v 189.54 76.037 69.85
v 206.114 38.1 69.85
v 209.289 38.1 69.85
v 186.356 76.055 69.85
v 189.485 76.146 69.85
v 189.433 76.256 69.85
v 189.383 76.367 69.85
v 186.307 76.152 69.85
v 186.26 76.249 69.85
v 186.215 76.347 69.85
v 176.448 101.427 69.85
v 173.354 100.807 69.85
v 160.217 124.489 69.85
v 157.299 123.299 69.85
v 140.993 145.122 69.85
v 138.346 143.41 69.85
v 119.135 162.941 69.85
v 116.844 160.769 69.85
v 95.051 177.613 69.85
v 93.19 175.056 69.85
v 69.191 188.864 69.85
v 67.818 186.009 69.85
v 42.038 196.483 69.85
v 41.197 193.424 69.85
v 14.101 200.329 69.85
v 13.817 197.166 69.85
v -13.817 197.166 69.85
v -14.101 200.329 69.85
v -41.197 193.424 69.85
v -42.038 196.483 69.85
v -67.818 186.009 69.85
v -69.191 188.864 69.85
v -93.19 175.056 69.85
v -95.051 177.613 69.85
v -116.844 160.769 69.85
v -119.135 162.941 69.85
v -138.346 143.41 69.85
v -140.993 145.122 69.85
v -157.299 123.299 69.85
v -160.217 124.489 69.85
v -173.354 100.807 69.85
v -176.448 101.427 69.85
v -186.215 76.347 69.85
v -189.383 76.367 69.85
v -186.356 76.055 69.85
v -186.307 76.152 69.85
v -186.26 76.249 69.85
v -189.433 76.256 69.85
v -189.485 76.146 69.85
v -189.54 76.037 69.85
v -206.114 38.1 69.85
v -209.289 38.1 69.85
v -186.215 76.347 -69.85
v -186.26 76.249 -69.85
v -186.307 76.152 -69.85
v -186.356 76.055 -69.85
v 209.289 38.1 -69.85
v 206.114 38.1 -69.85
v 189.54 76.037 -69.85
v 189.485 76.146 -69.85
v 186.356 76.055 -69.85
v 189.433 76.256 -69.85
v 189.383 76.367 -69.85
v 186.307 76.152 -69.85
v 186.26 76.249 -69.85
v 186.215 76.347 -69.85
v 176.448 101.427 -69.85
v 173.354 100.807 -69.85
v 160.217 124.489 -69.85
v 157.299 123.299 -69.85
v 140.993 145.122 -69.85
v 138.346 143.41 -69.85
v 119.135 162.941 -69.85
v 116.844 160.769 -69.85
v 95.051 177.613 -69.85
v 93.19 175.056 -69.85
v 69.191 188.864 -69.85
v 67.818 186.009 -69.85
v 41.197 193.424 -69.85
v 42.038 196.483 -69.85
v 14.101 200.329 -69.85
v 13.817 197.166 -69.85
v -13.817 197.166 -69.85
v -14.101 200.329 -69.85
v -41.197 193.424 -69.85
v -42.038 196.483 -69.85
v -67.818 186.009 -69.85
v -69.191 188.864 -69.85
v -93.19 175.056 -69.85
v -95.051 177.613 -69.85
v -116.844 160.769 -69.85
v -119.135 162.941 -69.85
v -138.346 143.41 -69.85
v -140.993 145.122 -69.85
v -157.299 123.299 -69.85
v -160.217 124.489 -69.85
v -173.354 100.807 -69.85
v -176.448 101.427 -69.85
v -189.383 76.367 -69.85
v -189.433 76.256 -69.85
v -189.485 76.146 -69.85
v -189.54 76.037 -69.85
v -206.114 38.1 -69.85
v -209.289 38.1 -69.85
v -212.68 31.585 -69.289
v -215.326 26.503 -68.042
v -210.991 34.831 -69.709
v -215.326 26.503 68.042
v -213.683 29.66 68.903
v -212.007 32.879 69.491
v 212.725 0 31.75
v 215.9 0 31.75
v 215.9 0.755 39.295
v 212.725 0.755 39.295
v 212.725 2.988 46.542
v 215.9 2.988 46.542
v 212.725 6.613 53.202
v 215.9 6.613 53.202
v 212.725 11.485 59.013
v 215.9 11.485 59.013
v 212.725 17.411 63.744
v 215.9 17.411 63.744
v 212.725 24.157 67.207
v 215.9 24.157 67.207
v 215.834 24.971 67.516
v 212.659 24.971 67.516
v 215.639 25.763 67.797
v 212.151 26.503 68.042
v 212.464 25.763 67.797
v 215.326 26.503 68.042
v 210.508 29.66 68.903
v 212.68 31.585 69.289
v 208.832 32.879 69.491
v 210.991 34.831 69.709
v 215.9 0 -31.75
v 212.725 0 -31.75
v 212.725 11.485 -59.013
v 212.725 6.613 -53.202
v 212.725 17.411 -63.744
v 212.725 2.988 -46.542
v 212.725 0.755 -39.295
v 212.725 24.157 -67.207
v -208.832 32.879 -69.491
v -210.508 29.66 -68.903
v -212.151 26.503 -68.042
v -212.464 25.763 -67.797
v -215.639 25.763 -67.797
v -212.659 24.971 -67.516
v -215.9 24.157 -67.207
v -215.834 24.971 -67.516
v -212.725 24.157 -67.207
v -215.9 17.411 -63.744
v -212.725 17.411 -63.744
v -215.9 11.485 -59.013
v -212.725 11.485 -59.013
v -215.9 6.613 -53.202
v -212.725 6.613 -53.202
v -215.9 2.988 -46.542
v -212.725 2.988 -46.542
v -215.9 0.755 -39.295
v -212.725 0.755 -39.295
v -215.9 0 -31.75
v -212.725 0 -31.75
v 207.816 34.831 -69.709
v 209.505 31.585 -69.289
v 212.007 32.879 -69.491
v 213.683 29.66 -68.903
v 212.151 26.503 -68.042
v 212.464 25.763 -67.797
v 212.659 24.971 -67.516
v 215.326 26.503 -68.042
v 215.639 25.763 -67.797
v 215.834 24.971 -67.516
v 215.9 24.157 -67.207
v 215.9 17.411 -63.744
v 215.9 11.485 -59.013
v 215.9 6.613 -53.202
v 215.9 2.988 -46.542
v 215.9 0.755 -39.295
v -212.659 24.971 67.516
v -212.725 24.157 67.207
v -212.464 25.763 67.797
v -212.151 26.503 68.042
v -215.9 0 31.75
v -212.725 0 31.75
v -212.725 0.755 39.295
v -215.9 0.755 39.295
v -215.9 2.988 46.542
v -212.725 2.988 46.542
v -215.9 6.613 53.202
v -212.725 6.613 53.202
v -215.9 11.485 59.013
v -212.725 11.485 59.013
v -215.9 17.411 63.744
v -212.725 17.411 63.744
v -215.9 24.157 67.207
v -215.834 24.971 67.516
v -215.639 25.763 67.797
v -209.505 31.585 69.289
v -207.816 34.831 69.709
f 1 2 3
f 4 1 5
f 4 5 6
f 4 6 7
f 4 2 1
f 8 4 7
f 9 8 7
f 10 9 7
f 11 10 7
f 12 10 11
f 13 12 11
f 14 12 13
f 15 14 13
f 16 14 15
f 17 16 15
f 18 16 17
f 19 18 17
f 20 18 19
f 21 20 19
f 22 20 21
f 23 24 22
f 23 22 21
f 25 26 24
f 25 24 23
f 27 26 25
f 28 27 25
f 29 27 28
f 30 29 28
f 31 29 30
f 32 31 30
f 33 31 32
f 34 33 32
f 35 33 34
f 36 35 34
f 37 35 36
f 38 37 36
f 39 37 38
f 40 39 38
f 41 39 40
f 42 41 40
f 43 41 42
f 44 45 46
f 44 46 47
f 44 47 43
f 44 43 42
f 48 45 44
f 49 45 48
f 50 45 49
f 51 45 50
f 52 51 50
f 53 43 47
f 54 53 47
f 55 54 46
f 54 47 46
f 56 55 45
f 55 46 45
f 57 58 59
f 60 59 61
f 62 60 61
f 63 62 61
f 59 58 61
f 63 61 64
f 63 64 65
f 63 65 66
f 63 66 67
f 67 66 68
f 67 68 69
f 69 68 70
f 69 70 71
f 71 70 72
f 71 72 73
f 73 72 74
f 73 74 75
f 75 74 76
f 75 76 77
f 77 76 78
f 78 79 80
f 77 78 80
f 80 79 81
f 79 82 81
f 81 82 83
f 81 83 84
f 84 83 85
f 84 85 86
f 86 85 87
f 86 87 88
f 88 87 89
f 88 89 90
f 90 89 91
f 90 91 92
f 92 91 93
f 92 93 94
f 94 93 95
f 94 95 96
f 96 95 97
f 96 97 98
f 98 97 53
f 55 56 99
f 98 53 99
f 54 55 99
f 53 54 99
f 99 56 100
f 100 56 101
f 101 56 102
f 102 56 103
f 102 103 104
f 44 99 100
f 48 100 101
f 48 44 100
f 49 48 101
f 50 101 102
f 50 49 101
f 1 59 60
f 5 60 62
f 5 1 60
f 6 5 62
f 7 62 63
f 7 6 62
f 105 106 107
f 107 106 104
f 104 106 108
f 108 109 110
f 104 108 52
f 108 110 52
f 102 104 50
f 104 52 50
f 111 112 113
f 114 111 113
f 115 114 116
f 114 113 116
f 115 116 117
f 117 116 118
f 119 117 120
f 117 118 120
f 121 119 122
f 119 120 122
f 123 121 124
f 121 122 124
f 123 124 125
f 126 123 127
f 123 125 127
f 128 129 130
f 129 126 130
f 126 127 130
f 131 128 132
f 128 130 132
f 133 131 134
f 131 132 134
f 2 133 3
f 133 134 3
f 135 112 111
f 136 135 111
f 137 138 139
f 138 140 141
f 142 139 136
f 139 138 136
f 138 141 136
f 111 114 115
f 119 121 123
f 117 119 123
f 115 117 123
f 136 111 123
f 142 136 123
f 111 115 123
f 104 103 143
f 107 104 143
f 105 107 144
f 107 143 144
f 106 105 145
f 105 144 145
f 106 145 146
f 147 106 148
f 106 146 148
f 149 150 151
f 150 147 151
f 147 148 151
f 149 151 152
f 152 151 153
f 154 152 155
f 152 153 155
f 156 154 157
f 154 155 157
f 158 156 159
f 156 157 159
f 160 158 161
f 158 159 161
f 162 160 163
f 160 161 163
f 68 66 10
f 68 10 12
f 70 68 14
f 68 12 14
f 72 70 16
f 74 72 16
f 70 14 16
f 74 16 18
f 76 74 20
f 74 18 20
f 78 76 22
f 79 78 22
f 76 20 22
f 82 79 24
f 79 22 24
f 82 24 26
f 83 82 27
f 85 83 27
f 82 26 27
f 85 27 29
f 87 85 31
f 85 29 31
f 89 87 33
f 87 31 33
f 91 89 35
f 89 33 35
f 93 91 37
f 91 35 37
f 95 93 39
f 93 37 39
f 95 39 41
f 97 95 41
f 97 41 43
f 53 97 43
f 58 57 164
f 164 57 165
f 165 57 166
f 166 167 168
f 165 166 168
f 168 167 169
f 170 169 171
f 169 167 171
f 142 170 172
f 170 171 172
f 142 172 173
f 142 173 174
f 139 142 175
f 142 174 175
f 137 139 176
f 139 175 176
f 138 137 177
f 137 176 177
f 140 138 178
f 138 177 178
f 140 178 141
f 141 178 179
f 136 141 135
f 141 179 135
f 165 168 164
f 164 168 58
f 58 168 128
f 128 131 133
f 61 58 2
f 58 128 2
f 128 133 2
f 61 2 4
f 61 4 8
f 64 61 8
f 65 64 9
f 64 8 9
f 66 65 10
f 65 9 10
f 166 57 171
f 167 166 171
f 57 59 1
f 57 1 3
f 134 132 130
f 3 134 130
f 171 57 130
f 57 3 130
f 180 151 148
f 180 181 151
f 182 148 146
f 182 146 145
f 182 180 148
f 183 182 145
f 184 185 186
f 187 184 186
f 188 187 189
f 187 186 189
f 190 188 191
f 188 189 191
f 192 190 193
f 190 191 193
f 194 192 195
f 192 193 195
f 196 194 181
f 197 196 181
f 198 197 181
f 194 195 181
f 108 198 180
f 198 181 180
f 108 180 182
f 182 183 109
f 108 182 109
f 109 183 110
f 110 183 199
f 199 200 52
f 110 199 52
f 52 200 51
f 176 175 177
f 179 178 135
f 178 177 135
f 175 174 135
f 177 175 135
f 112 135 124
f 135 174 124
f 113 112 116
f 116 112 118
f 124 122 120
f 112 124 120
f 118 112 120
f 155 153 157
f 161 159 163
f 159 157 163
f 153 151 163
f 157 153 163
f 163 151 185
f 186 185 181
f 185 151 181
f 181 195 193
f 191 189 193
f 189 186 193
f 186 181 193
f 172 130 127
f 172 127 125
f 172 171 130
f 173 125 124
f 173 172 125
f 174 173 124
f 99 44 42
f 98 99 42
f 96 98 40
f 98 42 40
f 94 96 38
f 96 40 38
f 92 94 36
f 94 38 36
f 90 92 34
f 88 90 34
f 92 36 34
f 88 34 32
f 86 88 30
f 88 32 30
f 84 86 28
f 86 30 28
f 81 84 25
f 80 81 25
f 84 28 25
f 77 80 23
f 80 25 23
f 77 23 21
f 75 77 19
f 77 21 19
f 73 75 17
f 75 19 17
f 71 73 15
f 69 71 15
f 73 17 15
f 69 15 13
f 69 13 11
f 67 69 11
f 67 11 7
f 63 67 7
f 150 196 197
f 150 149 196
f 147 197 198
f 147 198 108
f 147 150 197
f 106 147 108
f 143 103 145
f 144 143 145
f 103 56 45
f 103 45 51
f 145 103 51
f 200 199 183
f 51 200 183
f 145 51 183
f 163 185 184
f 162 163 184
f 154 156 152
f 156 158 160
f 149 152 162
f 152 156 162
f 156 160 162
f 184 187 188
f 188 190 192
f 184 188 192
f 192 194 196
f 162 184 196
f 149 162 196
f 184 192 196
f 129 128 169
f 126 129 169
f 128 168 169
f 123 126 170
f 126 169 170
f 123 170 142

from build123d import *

# Parameters (mm, degrees)
BOSS_EXTRUDE1_DEPTH = 69.85
FILLET1_R           = 38.1
FILLET2_R           = 38.1
FILLET3_R           = 38.1
FILLET4_R           = 38.1
FILLET5_R           = 5.08
FILLET6_R           = 5.08


with BuildPart() as part:
    # Sketch2 → Boss-Extrude1 (new, symmetric)
    with BuildSketch(Plane.XY):
        with BuildLine():
            Line((-212.725, 0), (-215.9, 0))
            Line((-215.9, 0), (-215.9, 25.4))
            Line((-215.9, 25.4), (-189.455193832, 76.2))
            ThreePointArc((-189.455193832, 76.2), (0, 200.810907661), (189.455193832, 76.2))
            Line((189.455193832, 76.2), (215.9, 25.4))
            Line((215.9, 25.4), (215.9, 0))
            Line((215.9, 0), (212.725, 0))
            Line((212.725, 0), (212.725, 25.4))
            Line((212.725, 25.4), (186.280193832, 76.2))
            ThreePointArc((186.280193832, 76.2), (0, 197.635907661), (-186.280193832, 76.2))
            Line((-186.280193832, 76.2), (-212.725, 25.4))
            Line((-212.725, 25.4), (-212.725, 0))
        make_face()
    extrude(amount=BOSS_EXTRUDE1_DEPTH, both=True)

    # Fillet1
    # the kernel refuses this fillet: 38.1 mm, written as the material it takes off along each edge
    with BuildSketch(Plane(origin=(311.15, 0, -69.85), x_dir=(0, 1, 0), z_dir=(-1, 0, 0))) as fillet1_piece_1:
        with BuildLine():
            CenterArc((FILLET1_R, -FILLET1_R), FILLET1_R, 90, 90)
            Line((0, -FILLET1_R), (0, 0))
            Line((0, 0), (FILLET1_R, 0))
        make_face()
    extrude(amount=193.675, mode=Mode.SUBTRACT)

    # Fillet2
    # the kernel refuses this fillet: 38.1 mm, written as the material it takes off along each edge
    with BuildSketch(Plane(origin=(311.15, 0, 69.85), x_dir=(0, 0, -1), z_dir=(-1, 0, 0))) as fillet2_piece_1:
        with BuildLine():
            CenterArc((FILLET2_R, -FILLET2_R), FILLET2_R, 90, 90)
            Line((0, -FILLET2_R), (0, 0))
            Line((0, 0), (FILLET2_R, 0))
        make_face()
    extrude(amount=193.675, mode=Mode.SUBTRACT)

    # Fillet3
    # the kernel refuses this fillet: 38.1 mm, written as the material it takes off along each edge
    with BuildSketch(Plane(origin=(-117.475, 0, 69.85), x_dir=(0, 1, 0), z_dir=(-1, 0, 0))) as fillet3_piece_1:
        with BuildLine():
            CenterArc((FILLET3_R, FILLET3_R), FILLET3_R, 180, 90)
            Line((0, FILLET3_R), (0, 0))
            Line((0, 0), (FILLET3_R, 0))
        make_face()
    extrude(amount=193.675, mode=Mode.SUBTRACT)

    # Fillet4
    # the kernel refuses this fillet: 38.1 mm, written as the material it takes off along each edge
    with BuildSketch(Plane(origin=(-117.475, 0, -69.85), x_dir=(0, 1, 0), z_dir=(-1, 0, 0))) as fillet4_piece_1:
        with BuildLine():
            CenterArc((FILLET4_R, -FILLET4_R), FILLET4_R, 90, 90)
            Line((0, -FILLET4_R), (0, 0))
            Line((0, 0), (FILLET4_R, 0))
        make_face()
    extrude(amount=193.675, mode=Mode.SUBTRACT)

    # Fillet5
    fillet5_edges = [part.edges().sort_by_distance(p)[0] for p in [
        (215.9, 25.4, 0),
        (-215.9, 25.4, 0),
        (-212.725, 25.4, 0),
        (212.725, 25.4, 0),
    ]]
    fillet(fillet5_edges, radius=FILLET5_R)

    # Fillet6
    # the kernel refuses this fillet: 5.08 mm, written as the material it adds along each edge
    with BuildSketch(Plane(origin=(-189.455193832, 76.2, 69.85), x_dir=(0.3964547937843397, 0.9180542448490813, 0), z_dir=(0, 0, -1))) as fillet6_piece_1:
        with BuildLine():
            CenterArc((0.183763375, -5.079999508), FILLET6_R, 90.025204734, 4.118058509)
            Line((-0.183269559, -0.013276028), (0, 0))
            ThreePointArc((0, 0), (0.090764327, -1.9964e-05), (0.181528655, 0))
        make_face()
    extrude(amount=139.7)
    with BuildSketch(Plane(origin=(189.455193832, 76.2, 69.85), x_dir=(0.4617486132350293, -0.887010833178224, 0), z_dir=(0, 0, -1))) as fillet6_piece_2:
        with BuildLine():
            CenterArc((0.183749786, -5.08), FILLET6_R, 90, 4.118058509)
            ThreePointArc((-0.181054232, -0.01311555), (-0.090525673, -0.006577687), (0, 0))
            Line((0, 0), (0.183749786, 0))
        make_face()
    extrude(amount=139.7)
    # the kernel refuses this fillet: 5.08 mm, written as the material it takes off along each edge
    with BuildSketch(Plane(origin=(186.280193832, 76.2, 70.257743197), x_dir=(0.4617486132350699, -0.8870108331782028, 0), z_dir=(0, 0, -1))) as fillet6_2_piece_1:
        with BuildLine():
            CenterArc((0.163097279, -5.08), FILLET6_R, 90, 3.655257242)
            ThreePointArc((-0.160768001, -0.010334204), (-0.080382979, -0.005183004), (0, 0))
            Line((0, 0), (0.163097279, 0))
        make_face()
    extrude(amount=140.515486395, mode=Mode.SUBTRACT)
    with BuildSketch(Plane(origin=(-186.280193832, 76.2, 70.257743197), x_dir=(-0.46174861323509436, -0.8870108331781903, 0), z_dir=(0, 0, -1))) as fillet6_2_piece_2:
        with BuildLine():
            CenterArc((0.163097279, 5.08), FILLET6_R, 266.344742758, 3.655257242)
            ThreePointArc((-0.160768001, 0.010334204), (-0.080382979, 0.005183004), (0, 0))
            Line((0, 0), (0.163097279, 0))
        make_face()
    extrude(amount=140.515486395, mode=Mode.SUBTRACT)


solid = part.part
